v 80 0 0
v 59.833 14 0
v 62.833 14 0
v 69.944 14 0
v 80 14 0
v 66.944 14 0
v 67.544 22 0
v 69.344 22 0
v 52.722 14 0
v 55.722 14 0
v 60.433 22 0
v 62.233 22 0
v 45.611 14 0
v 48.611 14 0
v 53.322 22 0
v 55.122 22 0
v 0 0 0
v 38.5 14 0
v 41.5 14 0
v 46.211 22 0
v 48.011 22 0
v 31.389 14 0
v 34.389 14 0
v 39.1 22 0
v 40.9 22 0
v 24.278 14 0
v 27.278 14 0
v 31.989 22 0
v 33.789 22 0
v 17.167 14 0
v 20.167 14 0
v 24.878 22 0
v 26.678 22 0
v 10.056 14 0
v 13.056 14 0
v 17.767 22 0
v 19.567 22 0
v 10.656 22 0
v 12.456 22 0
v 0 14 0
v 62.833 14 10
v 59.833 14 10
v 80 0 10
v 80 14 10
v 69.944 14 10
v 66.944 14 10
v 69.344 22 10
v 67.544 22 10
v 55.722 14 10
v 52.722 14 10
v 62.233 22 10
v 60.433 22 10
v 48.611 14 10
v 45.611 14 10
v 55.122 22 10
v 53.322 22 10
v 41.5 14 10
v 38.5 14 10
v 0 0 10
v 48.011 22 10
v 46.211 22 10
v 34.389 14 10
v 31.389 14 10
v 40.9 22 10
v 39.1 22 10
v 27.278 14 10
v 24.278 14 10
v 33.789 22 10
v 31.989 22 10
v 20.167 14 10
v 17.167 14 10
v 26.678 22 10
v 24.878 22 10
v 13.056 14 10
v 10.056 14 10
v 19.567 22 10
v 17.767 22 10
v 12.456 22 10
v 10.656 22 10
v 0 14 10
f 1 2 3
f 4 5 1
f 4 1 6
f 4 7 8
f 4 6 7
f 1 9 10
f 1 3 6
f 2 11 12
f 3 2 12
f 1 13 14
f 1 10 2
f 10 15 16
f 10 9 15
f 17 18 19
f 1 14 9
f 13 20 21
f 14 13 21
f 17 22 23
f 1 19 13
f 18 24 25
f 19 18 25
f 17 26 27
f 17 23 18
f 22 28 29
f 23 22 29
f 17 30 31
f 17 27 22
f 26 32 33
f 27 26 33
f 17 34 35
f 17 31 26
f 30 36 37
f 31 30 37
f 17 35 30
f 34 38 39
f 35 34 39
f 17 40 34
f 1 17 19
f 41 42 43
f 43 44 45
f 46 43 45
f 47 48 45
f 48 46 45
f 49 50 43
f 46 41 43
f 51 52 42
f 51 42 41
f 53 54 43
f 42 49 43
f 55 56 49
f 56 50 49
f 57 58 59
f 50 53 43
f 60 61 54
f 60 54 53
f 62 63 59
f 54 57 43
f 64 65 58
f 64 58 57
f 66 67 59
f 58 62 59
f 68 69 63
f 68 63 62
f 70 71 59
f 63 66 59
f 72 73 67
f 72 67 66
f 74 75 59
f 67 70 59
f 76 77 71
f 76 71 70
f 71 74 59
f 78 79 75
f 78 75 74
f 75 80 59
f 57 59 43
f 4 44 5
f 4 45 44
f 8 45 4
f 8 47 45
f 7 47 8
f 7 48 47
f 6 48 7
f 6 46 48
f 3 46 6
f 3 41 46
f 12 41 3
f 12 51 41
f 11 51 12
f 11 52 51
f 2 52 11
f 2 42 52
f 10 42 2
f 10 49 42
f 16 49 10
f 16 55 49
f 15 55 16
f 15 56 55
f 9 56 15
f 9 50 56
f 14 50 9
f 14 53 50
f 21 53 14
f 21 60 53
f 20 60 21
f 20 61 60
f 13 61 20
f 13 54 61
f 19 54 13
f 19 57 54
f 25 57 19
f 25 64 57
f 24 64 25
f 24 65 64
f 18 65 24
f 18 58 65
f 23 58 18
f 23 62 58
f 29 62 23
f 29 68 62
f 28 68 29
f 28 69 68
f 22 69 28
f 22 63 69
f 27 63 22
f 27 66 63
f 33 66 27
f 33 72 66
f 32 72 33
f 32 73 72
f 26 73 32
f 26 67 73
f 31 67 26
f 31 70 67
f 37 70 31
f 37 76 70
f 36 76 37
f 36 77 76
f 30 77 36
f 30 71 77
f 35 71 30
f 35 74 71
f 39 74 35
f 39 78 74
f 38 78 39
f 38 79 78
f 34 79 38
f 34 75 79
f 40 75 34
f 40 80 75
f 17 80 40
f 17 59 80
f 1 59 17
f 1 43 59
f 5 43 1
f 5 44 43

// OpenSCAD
$fn = 32;

// ----------------------------------------------------------------------
// Gear rack: 9 teeth on a 80 mm bar, pitch 7.11 mm
// ----------------------------------------------------------------------

// --- parameters (mm) ---
profile_height = 10;      // extrusion height
profile_points = 40;      // points of the closed outline

profile = [[0, 0], [80, 0], [80, 14], [69.944, 14], [69.344, 22], [67.544, 22], [66.944, 14], [62.833, 14], [62.233, 22], [60.433, 22], [59.833, 14], [55.722, 14], [55.122, 22], [53.322, 22], [52.722, 14], [48.611, 14], [48.011, 22], [46.211, 22], [45.611, 14], [41.5, 14], [40.9, 22], [39.1, 22], [38.5, 14], [34.389, 14], [33.789, 22], [31.989, 22], [31.389, 14], [27.278, 14], [26.678, 22], [24.878, 22], [24.278, 14], [20.167, 14], [19.567, 22], [17.767, 22], [17.167, 14], [13.056, 14], [12.456, 22], [10.656, 22], [10.056, 14], [0, 14]];  // single closed polygon, 40 points, counter clockwise

// --- the one profile operation ---
linear_extrude(height = profile_height) polygon(points = profile);
